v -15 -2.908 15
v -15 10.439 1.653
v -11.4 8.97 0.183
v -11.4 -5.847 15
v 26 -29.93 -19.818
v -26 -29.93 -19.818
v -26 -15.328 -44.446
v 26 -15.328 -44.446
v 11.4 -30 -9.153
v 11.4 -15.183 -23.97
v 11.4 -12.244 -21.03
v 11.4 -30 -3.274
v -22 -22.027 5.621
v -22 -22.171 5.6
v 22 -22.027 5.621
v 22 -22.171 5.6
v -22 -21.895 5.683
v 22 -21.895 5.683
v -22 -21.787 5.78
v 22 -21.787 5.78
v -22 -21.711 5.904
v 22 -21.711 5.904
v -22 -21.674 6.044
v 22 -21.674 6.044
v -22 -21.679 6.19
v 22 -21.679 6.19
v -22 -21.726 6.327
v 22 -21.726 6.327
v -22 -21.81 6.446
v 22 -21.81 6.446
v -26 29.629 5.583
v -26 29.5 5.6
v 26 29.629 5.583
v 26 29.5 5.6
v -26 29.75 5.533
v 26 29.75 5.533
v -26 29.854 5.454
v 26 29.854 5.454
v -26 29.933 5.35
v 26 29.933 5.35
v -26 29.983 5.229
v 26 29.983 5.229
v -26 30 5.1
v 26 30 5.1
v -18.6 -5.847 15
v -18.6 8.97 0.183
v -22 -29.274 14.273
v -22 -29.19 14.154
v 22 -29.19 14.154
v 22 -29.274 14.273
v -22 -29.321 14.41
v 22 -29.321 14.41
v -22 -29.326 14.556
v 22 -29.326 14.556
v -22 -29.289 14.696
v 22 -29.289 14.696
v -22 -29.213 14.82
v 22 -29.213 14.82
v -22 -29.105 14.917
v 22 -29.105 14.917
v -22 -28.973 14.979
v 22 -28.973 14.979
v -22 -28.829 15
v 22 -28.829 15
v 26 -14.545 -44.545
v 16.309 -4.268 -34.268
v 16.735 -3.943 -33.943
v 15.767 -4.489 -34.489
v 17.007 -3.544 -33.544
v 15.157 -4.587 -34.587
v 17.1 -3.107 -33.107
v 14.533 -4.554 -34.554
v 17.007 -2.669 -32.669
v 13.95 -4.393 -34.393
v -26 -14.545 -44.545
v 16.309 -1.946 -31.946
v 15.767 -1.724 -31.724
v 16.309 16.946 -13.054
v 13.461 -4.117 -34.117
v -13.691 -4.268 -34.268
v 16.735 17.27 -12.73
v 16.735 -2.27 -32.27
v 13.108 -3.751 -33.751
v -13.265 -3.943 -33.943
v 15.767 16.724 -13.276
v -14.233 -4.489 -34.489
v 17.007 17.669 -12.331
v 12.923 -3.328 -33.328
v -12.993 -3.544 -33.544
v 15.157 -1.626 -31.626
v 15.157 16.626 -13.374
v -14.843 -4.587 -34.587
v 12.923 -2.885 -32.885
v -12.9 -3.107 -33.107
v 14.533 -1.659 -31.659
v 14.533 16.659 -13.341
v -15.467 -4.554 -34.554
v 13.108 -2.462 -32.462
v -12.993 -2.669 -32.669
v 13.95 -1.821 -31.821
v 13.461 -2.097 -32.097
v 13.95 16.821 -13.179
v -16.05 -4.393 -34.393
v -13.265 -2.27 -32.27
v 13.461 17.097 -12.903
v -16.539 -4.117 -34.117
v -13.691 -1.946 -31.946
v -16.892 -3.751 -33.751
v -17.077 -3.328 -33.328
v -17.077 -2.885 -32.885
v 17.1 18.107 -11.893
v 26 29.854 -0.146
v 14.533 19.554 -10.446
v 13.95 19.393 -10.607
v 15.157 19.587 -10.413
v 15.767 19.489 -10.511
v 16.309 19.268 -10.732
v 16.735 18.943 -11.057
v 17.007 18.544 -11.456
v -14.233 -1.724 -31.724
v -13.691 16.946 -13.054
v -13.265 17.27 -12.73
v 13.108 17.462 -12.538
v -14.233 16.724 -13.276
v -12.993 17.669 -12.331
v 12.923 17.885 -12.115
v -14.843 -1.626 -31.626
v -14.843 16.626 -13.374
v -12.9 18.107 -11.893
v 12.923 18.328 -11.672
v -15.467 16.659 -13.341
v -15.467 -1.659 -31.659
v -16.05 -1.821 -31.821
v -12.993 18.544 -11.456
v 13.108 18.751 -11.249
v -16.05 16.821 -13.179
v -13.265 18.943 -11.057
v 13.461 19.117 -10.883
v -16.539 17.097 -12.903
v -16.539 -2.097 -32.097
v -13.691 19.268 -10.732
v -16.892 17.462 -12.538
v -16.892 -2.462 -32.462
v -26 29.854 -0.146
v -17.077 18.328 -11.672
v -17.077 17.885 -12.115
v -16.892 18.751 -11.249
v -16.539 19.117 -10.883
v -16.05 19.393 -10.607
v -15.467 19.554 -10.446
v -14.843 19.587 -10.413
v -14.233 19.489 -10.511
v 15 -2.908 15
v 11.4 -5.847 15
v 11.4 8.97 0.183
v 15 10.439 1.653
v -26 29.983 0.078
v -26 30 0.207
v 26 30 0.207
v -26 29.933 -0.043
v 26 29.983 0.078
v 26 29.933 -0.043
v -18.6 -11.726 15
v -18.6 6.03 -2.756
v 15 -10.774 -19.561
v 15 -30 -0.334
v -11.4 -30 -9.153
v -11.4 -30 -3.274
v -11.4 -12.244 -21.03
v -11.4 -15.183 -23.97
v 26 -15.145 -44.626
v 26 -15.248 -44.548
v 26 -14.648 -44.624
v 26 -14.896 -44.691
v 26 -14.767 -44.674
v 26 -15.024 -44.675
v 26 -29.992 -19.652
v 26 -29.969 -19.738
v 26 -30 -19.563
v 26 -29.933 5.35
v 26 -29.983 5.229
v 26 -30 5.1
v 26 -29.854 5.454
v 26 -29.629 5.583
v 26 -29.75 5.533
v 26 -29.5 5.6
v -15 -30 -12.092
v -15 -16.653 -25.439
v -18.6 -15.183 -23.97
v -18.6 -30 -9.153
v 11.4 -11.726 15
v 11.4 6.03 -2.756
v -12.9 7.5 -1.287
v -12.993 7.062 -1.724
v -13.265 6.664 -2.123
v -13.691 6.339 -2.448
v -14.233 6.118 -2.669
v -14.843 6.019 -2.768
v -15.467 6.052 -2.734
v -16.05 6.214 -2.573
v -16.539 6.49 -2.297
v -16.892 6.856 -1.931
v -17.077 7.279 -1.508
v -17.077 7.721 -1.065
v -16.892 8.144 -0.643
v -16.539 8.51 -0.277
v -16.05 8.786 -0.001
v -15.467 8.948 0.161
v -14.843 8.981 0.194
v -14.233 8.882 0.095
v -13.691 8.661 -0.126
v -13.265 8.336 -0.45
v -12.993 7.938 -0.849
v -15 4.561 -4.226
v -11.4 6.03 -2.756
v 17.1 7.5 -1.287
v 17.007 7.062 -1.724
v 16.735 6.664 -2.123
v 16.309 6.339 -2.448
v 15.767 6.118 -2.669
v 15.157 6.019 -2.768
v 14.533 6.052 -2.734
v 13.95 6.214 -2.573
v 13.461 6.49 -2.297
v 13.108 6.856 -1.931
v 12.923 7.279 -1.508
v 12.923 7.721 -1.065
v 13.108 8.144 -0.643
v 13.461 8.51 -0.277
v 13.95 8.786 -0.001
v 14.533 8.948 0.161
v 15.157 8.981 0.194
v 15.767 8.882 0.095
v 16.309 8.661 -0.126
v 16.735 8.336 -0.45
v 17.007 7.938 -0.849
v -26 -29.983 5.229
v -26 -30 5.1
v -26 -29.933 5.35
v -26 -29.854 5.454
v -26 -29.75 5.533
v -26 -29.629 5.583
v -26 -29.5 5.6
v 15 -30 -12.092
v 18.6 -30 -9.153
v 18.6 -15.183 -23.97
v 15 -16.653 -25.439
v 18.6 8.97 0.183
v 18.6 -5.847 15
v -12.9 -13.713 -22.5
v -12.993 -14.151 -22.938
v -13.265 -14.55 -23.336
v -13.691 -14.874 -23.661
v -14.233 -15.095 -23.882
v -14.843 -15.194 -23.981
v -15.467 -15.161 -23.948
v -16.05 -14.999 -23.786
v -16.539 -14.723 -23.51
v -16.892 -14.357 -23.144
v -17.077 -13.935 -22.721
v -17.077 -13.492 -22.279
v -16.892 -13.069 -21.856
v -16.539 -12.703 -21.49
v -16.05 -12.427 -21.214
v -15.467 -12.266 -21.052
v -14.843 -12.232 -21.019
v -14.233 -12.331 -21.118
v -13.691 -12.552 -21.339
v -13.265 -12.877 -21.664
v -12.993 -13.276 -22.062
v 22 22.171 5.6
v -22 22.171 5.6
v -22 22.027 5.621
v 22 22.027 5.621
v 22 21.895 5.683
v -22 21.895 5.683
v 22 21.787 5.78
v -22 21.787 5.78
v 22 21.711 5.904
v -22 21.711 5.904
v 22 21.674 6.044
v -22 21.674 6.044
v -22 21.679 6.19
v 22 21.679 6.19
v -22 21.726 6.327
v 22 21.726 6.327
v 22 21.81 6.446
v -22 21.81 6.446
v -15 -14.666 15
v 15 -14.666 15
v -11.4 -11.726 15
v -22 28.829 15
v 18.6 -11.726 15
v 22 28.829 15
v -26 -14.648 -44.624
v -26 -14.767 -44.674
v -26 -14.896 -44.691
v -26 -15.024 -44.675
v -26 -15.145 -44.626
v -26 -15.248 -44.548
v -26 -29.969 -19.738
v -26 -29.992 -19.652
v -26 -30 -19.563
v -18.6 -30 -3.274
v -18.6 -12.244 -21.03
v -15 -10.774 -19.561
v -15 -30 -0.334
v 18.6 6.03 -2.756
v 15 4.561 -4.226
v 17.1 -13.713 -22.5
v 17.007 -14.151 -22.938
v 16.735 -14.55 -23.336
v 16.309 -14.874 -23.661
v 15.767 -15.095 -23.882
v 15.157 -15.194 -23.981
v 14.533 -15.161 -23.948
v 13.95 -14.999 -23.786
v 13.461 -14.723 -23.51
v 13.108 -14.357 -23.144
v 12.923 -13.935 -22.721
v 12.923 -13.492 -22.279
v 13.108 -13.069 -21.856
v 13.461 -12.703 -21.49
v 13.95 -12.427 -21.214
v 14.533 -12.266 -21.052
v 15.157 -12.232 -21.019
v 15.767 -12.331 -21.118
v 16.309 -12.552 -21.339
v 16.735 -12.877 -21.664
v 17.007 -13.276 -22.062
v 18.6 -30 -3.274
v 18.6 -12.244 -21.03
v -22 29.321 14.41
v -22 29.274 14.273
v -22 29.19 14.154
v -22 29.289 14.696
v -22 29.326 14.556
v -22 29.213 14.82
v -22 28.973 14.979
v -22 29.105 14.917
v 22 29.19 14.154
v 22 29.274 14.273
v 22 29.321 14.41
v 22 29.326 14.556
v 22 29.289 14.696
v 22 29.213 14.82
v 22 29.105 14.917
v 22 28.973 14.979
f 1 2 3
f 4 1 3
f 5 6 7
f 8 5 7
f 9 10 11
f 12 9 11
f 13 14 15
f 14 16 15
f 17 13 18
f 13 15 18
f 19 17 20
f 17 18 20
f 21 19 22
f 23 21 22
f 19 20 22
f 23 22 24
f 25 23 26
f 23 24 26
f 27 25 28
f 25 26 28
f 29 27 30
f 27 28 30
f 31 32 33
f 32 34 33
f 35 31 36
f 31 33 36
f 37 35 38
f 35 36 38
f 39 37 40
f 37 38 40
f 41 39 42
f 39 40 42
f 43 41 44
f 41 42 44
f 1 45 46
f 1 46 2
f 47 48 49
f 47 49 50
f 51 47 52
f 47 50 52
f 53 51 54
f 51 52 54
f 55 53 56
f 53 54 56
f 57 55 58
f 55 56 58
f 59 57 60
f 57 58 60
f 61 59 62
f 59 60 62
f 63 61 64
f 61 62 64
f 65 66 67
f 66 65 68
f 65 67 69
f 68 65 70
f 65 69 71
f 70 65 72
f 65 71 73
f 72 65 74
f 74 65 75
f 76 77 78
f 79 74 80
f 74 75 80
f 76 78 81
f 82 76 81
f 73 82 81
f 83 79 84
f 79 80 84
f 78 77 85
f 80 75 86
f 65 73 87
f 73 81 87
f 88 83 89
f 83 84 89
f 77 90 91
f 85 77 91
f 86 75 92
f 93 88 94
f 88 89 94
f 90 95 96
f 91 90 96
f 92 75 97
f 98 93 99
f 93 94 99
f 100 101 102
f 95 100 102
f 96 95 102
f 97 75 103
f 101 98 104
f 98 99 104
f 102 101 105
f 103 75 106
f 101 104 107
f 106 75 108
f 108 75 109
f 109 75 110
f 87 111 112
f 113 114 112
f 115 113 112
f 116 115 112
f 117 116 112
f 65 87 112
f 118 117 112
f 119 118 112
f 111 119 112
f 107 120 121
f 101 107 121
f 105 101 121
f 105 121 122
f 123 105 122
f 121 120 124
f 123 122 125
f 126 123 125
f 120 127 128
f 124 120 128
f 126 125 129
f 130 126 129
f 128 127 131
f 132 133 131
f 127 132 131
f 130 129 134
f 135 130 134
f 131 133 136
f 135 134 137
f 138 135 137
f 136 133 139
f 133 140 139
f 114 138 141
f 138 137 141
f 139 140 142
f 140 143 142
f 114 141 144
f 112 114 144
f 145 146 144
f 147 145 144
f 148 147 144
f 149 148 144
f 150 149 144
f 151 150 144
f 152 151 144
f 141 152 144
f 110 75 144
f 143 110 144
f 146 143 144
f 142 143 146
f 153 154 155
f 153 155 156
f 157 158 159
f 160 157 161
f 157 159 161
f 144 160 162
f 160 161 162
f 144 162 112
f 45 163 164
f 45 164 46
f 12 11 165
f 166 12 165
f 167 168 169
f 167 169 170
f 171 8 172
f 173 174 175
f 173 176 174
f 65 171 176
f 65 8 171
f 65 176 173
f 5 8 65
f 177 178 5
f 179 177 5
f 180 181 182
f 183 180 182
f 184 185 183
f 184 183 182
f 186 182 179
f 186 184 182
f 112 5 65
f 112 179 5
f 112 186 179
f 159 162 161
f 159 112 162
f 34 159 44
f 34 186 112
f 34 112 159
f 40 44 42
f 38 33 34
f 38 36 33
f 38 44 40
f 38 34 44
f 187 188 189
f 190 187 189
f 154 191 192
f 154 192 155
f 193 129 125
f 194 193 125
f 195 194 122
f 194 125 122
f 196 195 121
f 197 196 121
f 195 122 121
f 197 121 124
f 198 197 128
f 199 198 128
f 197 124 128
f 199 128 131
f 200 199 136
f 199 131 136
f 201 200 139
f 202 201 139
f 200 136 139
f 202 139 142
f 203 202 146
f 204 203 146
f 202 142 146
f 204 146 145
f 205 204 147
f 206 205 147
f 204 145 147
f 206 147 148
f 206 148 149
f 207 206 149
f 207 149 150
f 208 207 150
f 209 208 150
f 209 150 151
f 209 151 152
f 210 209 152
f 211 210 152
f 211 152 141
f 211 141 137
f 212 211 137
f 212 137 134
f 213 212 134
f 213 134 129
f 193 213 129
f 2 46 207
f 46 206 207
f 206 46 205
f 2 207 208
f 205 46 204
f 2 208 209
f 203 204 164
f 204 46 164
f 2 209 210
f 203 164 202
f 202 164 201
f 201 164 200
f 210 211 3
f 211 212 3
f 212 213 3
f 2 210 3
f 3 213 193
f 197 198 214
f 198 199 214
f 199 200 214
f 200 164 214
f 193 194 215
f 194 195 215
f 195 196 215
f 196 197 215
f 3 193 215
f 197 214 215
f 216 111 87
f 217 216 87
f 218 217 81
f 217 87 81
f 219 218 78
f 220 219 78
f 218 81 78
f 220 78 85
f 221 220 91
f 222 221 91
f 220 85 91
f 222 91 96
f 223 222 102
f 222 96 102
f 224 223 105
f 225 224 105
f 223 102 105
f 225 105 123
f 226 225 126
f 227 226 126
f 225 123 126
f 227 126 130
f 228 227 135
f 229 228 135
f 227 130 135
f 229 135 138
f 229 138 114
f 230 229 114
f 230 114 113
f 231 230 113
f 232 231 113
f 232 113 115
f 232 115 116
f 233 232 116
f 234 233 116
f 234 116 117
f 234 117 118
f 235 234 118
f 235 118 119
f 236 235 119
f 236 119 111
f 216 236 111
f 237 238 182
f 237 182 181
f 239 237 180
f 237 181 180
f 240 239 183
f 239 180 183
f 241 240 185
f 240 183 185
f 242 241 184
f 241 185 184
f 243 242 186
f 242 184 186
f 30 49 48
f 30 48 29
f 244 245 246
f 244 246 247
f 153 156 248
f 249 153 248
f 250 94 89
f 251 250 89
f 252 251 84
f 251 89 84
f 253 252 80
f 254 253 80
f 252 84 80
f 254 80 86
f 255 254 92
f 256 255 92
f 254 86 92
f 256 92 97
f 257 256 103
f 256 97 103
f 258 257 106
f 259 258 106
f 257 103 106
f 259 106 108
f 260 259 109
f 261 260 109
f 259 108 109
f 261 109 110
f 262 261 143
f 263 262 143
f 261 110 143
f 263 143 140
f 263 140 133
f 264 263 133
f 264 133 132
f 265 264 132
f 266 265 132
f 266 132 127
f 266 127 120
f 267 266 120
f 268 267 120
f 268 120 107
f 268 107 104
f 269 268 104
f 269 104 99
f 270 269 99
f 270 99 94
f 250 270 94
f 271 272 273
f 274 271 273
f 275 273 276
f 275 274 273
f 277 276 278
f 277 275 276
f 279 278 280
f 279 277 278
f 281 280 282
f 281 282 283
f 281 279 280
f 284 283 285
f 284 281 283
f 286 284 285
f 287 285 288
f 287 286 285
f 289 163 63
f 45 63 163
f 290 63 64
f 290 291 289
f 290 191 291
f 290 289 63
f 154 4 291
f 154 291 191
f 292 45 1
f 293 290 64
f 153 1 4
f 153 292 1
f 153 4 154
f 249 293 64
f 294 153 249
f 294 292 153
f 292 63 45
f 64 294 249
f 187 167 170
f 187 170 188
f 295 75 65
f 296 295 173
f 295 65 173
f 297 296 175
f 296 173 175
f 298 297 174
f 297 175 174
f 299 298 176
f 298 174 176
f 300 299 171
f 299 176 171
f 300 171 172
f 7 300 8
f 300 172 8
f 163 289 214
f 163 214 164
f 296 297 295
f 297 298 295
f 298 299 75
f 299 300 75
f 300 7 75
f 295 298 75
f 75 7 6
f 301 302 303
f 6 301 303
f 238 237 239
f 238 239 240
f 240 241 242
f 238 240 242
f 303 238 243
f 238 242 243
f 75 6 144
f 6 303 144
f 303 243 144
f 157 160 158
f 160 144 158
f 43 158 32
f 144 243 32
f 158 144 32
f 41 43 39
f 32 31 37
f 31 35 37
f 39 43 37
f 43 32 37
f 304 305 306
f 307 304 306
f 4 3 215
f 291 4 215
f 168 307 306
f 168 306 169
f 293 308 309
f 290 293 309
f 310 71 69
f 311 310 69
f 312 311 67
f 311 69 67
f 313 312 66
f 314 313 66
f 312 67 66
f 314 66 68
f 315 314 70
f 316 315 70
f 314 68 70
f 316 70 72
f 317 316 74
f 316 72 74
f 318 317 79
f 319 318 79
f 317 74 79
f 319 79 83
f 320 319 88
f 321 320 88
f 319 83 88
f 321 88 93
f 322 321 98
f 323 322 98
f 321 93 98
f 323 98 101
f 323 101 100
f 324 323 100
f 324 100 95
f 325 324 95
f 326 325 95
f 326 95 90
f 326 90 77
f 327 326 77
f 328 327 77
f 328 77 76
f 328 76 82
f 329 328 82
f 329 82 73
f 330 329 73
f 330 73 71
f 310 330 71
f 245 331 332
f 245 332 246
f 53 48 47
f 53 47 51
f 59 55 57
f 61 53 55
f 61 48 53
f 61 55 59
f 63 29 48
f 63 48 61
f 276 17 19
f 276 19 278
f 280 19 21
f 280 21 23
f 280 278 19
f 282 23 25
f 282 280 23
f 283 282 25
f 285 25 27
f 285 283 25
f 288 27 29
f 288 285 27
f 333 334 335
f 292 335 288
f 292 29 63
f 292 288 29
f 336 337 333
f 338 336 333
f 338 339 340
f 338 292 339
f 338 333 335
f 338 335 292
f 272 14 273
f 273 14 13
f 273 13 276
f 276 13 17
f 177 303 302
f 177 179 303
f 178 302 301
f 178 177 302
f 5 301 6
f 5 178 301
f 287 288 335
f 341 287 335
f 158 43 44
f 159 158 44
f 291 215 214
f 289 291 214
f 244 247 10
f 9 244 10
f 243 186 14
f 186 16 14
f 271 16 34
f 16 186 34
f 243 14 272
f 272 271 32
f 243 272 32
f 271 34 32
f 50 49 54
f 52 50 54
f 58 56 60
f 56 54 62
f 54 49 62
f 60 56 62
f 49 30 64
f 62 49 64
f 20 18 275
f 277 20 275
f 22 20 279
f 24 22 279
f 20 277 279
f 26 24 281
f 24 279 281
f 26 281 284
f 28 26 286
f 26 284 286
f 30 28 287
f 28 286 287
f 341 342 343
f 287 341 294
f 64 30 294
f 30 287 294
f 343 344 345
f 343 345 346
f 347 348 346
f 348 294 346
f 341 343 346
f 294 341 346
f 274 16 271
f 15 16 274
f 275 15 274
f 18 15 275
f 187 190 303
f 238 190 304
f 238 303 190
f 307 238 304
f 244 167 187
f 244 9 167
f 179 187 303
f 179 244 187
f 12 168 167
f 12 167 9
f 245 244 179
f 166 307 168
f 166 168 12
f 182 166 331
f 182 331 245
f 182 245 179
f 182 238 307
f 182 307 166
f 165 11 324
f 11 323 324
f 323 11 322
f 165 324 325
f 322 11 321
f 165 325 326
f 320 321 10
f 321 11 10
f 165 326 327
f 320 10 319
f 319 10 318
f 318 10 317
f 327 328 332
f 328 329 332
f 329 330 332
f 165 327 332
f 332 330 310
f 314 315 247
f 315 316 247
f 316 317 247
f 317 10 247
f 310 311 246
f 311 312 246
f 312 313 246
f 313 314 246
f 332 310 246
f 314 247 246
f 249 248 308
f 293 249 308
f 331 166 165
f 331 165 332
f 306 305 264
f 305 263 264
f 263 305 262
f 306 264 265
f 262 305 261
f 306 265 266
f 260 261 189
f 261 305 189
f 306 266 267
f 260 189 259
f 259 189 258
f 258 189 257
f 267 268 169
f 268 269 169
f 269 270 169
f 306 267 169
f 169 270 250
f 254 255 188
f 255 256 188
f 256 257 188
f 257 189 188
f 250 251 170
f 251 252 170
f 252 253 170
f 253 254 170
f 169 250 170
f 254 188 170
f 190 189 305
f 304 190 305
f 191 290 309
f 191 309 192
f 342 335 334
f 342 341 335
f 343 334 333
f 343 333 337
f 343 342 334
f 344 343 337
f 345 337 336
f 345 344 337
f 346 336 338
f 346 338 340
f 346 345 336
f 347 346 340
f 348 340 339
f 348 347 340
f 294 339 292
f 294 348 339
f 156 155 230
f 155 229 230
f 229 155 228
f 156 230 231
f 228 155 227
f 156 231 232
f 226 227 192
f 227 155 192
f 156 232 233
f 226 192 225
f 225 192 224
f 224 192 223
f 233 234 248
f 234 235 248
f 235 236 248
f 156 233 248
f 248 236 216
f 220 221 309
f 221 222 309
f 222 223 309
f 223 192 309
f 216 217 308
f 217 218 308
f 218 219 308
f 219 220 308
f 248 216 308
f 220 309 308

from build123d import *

# Parameters (mm, degrees)
F0_W      = 52
F0_H      = 60
F1_DEPTH  = 15
F3_W      = 4
F3_H      = 9.4
F4_DEPTH  = 60
F5_DEPTH  = 56.9
F6_DEPTH  = 45
F8_DEPTH  = 63.8
F9_R      = 2.1
F10_DEPTH = 101.4
F11_START = -15
F11_DEPTH = 49.6
F13_DEPTH = 115.6
F14_R     = 0.5


with BuildPart() as f1:
    # F0 (on Top) → F1 (new body)
    with BuildSketch(Plane.XY):
        Rectangle(F0_W, F0_H)
    extrude(amount=F1_DEPTH)

    # F3 (on face) → F4 (cut, through all)
    with BuildSketch(Plane(origin=(0, 30, 0), x_dir=(-1, 0, 0), z_dir=(0, 1, 0))):
        with Locations((-24, 10.3)):
            Rectangle(F3_W, F3_H)
        with Locations((24, 10.3)):
            Rectangle(F3_W, F3_H)
    extrude(amount=-F4_DEPTH, mode=Mode.SUBTRACT)

    # F2 (on face) → F5 (cut)
    with BuildSketch(Plane(origin=(-26, 0, 0), x_dir=(0, -1, 0), z_dir=(-1, 0, 0))):
        Polygon((-21, 5.6), (-30, 15), (-30, 5.6), align=None)
        Polygon((30, 5.6), (30, 15), (21, 5.6), align=None)
    extrude(amount=-F5_DEPTH, mode=Mode.SUBTRACT)

    # F6 (add): a face of the model
    f6_faces = [f1.faces().sort_by_distance(p)[0] for p in [
        (0, 0, 0),
    ]]
    extrude(f6_faces, amount=F6_DEPTH)

    # F7 (on face) → F8 (cut)
    with BuildSketch(Plane(origin=(-26, 0, 0), x_dir=(0, -1, 0), z_dir=(-1, 0, 0))):
        Polygon((15, -45), (-30, 0), (-30, -45), align=None)
    extrude(amount=-F8_DEPTH, mode=Mode.SUBTRACT)

    # F9 (on face) → F10 (cut)
    with BuildSketch(Plane(origin=(0, 15, -15), x_dir=(1, 0, 0), z_dir=(0, 0.7071067812, -0.7071067812))):
        with Locations((-15, -4.3933982822)):
            Circle(F9_R)
        with Locations((-15, 25.6066017178)):
            Circle(F9_R)
        with Locations((15, -4.3933982822)):
            Circle(F9_R)
        with Locations((15, 25.6066017178)):
            Circle(F9_R)
    extrude(amount=-F10_DEPTH, mode=Mode.SUBTRACT)

    # F9 (on face) → F11 (cut)
    with BuildSketch(Plane(origin=(0, 15, -15), x_dir=(1, 0, 0), z_dir=(0, 0.7071067812, -0.7071067812)).offset(F11_START)):
        Polygon((-11.4, -6.4718592513), (-11.4, -2.3149373131), (-15, -0.236476344), (-18.6, -2.3149373131), (-18.6, -6.4718592513), (-15, -8.5503202204), align=None)
        with Locations((-15, -4.3933982822)):
            Circle(F9_R, mode=Mode.SUBTRACT)
        Polygon((-11.4, 23.5281407487), (-11.4, 27.6850626869), (-15, 29.763523656), (-18.6, 27.6850626869), (-18.6, 23.5281407487), (-15, 21.4496797796), align=None)
        with Locations((-15, 25.6066017178)):
            Circle(F9_R, mode=Mode.SUBTRACT)
        Polygon((11.4, 27.6850626869), (11.4, 23.5281407487), (15, 21.4496797796), (18.6, 23.5281407487), (18.6, 27.6850626869), (15, 29.763523656), align=None)
        with Locations((15, 25.6066017178)):
            Circle(F9_R, mode=Mode.SUBTRACT)
        Polygon((11.4, -2.3149373131), (11.4, -6.4718592513), (15, -8.5503202204), (18.6, -6.4718592513), (18.6, -2.3149373131), (15, -0.236476344), align=None)
        with Locations((15, -4.3933982822)):
            Circle(F9_R, mode=Mode.SUBTRACT)
    extrude(amount=-F11_DEPTH, mode=Mode.SUBTRACT)

    # F12 (on face) → F13 (cut)
    with BuildSketch(Plane(origin=(-26, 0, 0), x_dir=(0, -1, 0), z_dir=(-1, 0, 0))):
        Polygon((30, -19.7), (15, -45), (30, -45), align=None)
    extrude(amount=-F13_DEPTH, mode=Mode.SUBTRACT)

    # F14
    f14_edges = [f1.edges().sort_by_distance(p)[0] for p in [
        (0, -30, 5.6),
        (0, -30, -19.7),
        (0, 30, 5.6),
        (0, -30, 15),
        (0, 30, 15),
        (0, -21, 5.6),
        (0, 21, 5.6),
        (0, 30, 0),
        (0, -15, -45),
    ]]
    fillet(f14_edges, radius=F14_R)


solid = f1.part
